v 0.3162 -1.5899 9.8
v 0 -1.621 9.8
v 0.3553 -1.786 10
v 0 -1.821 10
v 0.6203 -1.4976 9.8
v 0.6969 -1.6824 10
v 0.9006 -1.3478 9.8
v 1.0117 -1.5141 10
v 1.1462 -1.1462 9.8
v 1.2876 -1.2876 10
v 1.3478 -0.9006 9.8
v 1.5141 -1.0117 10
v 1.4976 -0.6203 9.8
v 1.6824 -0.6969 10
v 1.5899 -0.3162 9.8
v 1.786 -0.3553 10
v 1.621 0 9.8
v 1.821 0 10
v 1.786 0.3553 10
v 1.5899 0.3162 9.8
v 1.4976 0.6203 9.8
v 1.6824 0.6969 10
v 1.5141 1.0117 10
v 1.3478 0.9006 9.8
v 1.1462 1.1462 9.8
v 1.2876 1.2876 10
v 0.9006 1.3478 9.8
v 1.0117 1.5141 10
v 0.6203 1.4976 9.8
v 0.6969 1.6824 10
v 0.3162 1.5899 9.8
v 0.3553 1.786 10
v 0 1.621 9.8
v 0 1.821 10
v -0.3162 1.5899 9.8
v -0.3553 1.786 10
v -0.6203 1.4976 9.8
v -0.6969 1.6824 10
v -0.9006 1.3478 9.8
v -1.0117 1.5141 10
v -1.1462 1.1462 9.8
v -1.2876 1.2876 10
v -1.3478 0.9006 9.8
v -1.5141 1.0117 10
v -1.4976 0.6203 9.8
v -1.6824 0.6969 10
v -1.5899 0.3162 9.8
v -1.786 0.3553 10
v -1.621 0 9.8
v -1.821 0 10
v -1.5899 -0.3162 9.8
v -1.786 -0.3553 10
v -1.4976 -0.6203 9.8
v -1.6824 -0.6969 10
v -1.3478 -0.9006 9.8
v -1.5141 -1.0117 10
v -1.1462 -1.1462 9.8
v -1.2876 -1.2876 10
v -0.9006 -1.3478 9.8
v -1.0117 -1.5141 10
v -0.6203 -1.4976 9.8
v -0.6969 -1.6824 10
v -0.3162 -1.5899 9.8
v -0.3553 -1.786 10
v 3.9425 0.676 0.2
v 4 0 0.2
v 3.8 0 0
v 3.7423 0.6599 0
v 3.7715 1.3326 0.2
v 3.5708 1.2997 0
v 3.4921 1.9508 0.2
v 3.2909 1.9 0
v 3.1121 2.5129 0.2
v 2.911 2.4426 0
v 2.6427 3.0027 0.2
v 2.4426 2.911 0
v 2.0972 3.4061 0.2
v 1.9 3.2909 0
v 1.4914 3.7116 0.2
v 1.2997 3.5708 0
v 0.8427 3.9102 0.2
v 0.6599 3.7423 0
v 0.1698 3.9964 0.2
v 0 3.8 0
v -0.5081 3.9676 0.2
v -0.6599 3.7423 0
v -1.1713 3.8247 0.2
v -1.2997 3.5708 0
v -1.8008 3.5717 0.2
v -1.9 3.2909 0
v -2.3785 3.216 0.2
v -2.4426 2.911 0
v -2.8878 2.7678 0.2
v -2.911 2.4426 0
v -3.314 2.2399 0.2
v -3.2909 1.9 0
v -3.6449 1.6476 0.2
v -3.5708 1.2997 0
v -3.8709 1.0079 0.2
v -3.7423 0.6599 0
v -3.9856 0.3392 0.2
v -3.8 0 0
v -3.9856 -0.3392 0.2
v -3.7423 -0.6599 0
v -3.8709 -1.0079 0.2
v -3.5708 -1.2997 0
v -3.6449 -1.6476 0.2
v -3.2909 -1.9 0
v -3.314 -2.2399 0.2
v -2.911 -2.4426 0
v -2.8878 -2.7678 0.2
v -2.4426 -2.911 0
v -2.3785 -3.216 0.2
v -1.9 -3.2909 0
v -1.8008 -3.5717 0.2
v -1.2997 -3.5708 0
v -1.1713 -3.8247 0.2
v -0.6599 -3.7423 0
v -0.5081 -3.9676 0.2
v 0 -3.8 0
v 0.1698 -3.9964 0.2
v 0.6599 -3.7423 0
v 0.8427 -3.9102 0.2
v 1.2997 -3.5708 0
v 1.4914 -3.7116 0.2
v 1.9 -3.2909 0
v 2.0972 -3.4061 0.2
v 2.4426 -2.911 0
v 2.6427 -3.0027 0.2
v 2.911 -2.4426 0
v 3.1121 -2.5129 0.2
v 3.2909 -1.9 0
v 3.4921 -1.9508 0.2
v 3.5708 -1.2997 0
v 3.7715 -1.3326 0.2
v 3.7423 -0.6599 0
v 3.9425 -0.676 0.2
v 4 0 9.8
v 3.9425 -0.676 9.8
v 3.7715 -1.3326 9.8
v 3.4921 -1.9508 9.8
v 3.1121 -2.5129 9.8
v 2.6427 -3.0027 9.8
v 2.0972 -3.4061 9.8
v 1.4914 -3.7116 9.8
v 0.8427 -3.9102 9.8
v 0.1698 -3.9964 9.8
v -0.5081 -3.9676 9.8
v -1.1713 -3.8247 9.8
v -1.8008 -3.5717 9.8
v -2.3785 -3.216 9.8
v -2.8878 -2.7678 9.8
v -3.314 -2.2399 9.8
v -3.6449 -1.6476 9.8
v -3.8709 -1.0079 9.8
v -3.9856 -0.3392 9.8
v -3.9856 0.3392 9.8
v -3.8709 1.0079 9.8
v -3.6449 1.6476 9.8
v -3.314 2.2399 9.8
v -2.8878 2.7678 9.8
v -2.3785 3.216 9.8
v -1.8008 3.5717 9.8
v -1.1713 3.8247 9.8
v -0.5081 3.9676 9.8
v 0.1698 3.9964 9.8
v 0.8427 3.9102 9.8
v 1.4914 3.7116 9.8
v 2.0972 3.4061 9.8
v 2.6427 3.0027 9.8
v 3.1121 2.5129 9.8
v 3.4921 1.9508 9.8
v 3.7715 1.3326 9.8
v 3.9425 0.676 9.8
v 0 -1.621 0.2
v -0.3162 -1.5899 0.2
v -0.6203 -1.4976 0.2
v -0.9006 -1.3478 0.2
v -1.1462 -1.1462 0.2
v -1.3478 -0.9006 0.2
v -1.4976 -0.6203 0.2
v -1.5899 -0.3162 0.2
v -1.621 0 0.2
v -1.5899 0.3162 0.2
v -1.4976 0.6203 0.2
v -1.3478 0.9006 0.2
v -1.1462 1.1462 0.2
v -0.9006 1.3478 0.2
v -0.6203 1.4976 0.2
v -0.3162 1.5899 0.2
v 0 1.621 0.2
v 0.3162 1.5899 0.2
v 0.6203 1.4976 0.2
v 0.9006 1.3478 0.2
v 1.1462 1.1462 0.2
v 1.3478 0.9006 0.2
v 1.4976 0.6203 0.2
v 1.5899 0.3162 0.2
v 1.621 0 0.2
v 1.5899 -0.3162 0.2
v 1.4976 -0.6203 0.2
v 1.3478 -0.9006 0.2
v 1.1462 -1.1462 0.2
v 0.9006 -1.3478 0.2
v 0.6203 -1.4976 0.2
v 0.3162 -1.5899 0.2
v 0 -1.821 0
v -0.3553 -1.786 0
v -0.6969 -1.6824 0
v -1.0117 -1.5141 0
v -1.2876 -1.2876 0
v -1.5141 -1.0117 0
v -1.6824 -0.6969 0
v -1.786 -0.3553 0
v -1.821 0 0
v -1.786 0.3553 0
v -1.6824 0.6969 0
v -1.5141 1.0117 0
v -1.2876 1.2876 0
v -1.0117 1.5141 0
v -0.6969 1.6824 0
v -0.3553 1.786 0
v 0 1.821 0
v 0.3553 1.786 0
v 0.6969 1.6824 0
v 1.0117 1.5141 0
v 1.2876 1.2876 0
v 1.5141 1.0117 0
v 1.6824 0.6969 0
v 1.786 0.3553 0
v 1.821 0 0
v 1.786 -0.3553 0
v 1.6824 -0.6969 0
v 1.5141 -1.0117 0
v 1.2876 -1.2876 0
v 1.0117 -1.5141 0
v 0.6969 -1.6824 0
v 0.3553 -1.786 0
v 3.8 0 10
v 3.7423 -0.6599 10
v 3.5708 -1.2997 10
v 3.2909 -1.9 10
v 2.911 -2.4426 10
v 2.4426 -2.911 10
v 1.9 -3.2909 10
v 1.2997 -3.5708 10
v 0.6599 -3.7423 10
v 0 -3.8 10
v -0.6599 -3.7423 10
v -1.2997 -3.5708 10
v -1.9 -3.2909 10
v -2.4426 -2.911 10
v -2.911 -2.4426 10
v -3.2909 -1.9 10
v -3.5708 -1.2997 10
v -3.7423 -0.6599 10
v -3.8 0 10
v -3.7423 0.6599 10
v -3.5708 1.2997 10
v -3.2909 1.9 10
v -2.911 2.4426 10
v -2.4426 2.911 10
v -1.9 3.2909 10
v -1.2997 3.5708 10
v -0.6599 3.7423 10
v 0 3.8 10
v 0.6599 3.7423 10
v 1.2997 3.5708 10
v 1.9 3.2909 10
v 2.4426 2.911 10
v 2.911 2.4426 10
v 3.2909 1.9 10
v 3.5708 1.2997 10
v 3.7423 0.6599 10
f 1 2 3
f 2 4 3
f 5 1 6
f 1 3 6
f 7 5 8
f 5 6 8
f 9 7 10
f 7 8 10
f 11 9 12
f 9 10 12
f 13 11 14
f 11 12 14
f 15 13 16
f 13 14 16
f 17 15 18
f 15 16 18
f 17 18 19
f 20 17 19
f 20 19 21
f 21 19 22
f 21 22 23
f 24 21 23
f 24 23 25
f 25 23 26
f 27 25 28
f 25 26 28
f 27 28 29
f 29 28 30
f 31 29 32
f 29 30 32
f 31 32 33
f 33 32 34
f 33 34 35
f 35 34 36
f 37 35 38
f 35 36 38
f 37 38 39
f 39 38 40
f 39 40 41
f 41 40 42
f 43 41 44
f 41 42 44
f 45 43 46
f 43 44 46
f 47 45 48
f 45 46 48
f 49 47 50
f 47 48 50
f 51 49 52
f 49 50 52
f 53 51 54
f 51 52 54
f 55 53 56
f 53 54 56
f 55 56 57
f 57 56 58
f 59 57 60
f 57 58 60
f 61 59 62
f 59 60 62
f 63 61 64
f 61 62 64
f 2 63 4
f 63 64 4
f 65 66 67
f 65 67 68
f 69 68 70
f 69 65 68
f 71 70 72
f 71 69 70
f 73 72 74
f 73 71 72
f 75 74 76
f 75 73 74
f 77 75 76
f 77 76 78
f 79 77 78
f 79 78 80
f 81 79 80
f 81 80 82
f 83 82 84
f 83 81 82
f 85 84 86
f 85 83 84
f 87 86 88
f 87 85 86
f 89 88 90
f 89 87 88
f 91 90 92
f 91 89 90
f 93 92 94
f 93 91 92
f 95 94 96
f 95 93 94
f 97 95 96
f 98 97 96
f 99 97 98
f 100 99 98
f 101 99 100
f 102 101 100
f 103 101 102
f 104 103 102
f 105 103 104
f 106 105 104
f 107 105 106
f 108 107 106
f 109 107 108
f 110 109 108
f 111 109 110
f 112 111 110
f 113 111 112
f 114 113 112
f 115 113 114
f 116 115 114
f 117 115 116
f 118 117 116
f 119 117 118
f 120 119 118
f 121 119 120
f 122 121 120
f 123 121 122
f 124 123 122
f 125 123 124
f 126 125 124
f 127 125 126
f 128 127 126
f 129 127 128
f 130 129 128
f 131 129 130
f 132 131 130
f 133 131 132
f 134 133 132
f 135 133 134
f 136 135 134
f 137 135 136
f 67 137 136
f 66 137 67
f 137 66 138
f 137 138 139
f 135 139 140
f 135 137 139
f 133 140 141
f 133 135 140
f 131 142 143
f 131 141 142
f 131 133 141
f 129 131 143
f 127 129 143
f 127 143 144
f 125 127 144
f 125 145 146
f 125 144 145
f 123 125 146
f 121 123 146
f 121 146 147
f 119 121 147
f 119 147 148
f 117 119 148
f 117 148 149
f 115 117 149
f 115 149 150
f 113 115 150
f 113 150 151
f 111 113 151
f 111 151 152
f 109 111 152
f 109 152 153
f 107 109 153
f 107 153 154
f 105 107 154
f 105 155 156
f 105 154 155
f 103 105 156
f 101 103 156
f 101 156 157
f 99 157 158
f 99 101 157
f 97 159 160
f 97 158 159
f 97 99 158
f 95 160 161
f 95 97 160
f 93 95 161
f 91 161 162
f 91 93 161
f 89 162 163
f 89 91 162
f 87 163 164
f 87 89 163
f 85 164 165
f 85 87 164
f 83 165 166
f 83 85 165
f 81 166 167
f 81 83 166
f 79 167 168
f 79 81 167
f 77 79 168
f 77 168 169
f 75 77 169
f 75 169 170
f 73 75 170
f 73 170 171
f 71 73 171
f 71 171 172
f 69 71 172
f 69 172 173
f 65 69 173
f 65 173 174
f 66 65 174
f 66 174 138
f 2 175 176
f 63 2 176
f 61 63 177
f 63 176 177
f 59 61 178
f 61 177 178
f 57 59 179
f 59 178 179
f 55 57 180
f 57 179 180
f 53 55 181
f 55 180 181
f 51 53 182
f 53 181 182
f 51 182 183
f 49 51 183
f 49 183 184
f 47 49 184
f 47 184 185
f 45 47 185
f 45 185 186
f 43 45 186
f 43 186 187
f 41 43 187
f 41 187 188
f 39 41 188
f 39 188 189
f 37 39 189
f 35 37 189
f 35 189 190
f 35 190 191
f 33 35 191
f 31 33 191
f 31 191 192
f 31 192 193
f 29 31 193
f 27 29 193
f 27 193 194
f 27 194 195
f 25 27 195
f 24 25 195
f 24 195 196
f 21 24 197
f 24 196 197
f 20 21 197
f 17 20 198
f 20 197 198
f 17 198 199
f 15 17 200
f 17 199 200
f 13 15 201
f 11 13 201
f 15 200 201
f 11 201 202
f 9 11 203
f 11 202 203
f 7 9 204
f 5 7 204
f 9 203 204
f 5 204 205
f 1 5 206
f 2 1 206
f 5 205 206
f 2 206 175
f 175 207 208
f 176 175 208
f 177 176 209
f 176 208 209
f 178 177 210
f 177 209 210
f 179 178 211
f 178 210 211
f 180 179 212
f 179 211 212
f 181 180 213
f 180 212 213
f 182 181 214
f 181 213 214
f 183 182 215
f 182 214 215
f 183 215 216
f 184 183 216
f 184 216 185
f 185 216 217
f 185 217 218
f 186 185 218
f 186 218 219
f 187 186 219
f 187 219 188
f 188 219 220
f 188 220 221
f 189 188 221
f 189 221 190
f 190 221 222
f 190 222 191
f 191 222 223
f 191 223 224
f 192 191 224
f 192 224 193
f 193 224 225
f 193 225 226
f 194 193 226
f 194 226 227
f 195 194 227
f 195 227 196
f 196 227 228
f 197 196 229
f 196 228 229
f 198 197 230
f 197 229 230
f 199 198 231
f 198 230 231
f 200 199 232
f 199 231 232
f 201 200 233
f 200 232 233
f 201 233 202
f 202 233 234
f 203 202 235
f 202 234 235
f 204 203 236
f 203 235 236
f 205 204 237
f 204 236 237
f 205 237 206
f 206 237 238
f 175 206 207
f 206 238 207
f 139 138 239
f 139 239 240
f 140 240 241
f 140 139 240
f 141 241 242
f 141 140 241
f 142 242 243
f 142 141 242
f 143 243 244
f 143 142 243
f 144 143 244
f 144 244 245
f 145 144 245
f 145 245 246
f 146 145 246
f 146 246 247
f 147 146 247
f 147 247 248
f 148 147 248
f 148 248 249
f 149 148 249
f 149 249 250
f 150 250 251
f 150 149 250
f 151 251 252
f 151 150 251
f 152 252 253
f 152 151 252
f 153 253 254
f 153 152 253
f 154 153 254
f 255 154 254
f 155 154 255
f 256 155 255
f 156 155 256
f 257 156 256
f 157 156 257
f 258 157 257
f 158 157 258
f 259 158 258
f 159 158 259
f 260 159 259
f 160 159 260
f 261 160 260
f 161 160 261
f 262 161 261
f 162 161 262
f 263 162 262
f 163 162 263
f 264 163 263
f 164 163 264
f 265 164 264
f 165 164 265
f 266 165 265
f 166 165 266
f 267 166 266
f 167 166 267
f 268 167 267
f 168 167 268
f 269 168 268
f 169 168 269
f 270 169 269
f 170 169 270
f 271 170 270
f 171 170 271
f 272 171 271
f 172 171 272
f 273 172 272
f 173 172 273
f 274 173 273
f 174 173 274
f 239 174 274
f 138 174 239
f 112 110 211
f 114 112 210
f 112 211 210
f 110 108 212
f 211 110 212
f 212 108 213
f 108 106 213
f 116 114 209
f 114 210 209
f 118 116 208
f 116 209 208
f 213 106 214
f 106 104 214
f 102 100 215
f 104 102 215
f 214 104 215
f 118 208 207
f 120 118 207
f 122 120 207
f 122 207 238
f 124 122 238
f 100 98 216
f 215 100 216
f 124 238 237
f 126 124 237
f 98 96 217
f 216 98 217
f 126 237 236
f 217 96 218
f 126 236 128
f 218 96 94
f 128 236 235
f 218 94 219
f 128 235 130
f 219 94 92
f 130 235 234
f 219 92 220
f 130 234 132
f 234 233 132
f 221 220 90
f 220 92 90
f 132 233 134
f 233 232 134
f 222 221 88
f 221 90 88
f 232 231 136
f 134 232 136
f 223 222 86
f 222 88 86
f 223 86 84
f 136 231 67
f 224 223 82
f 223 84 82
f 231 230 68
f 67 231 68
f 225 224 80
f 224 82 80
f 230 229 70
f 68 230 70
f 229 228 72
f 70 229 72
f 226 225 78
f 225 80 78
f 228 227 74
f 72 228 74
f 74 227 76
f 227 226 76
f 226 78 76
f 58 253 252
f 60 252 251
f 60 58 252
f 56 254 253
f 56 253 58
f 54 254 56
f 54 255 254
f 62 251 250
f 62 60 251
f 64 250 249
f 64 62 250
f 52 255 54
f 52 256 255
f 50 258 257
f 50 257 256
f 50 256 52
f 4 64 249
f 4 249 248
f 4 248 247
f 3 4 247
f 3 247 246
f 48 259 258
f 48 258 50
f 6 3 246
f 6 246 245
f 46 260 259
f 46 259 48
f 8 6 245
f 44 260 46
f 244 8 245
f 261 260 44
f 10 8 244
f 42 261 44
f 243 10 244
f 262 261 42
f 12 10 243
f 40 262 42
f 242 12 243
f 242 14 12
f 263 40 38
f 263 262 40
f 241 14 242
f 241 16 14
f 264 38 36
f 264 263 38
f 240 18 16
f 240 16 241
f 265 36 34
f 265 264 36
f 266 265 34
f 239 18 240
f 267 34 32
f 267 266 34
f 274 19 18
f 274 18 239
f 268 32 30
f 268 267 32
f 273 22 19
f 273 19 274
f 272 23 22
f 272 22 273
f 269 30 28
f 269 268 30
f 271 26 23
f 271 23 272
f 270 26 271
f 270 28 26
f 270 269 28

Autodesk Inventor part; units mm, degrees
ref_plane "YZ Plane" through (0, 0, 0) normal (1, 0, 0) x (0, 1, 0)
ref_plane "XZ Plane" through (0, 0, 0) normal (0, 1, 0) x (-1, 0, 0)
ref_plane "XY Plane" through (0, 0, 0) normal (0, 0, 1) x (1, 0, 0)
sketch "スケッチ1" plane through (0, 0, 0) normal (0, 0, 1) x (1, 0, 0)
  circle A0 centre (0, 0) radius 4
  dimension "d13" = 8
extrude "押し出し1" add sketch "スケッチ1" along normal blind 10
sketch "スケッチ2" plane through (0, 0, 10) normal (0, 0, 1) x (1, 0, 0)
  point P0 (0, 0)
  point P1 (0, 0)
hole "穴1" at (0, 0, 10) direction (0, 0, -1) diameter 3.242 end through all thread size "M4x0.7" class "6H" standard "ANSI Metric M Profile"
chamfer "面取り1" distance 0.2 angle 45 4 edges at (0, 1.621, 10) (0, 1.621, 0) (-4, 0, 10) (-4, 0, 0)
properties part number "ARF-410E" material "鋼、炭素鋼"
